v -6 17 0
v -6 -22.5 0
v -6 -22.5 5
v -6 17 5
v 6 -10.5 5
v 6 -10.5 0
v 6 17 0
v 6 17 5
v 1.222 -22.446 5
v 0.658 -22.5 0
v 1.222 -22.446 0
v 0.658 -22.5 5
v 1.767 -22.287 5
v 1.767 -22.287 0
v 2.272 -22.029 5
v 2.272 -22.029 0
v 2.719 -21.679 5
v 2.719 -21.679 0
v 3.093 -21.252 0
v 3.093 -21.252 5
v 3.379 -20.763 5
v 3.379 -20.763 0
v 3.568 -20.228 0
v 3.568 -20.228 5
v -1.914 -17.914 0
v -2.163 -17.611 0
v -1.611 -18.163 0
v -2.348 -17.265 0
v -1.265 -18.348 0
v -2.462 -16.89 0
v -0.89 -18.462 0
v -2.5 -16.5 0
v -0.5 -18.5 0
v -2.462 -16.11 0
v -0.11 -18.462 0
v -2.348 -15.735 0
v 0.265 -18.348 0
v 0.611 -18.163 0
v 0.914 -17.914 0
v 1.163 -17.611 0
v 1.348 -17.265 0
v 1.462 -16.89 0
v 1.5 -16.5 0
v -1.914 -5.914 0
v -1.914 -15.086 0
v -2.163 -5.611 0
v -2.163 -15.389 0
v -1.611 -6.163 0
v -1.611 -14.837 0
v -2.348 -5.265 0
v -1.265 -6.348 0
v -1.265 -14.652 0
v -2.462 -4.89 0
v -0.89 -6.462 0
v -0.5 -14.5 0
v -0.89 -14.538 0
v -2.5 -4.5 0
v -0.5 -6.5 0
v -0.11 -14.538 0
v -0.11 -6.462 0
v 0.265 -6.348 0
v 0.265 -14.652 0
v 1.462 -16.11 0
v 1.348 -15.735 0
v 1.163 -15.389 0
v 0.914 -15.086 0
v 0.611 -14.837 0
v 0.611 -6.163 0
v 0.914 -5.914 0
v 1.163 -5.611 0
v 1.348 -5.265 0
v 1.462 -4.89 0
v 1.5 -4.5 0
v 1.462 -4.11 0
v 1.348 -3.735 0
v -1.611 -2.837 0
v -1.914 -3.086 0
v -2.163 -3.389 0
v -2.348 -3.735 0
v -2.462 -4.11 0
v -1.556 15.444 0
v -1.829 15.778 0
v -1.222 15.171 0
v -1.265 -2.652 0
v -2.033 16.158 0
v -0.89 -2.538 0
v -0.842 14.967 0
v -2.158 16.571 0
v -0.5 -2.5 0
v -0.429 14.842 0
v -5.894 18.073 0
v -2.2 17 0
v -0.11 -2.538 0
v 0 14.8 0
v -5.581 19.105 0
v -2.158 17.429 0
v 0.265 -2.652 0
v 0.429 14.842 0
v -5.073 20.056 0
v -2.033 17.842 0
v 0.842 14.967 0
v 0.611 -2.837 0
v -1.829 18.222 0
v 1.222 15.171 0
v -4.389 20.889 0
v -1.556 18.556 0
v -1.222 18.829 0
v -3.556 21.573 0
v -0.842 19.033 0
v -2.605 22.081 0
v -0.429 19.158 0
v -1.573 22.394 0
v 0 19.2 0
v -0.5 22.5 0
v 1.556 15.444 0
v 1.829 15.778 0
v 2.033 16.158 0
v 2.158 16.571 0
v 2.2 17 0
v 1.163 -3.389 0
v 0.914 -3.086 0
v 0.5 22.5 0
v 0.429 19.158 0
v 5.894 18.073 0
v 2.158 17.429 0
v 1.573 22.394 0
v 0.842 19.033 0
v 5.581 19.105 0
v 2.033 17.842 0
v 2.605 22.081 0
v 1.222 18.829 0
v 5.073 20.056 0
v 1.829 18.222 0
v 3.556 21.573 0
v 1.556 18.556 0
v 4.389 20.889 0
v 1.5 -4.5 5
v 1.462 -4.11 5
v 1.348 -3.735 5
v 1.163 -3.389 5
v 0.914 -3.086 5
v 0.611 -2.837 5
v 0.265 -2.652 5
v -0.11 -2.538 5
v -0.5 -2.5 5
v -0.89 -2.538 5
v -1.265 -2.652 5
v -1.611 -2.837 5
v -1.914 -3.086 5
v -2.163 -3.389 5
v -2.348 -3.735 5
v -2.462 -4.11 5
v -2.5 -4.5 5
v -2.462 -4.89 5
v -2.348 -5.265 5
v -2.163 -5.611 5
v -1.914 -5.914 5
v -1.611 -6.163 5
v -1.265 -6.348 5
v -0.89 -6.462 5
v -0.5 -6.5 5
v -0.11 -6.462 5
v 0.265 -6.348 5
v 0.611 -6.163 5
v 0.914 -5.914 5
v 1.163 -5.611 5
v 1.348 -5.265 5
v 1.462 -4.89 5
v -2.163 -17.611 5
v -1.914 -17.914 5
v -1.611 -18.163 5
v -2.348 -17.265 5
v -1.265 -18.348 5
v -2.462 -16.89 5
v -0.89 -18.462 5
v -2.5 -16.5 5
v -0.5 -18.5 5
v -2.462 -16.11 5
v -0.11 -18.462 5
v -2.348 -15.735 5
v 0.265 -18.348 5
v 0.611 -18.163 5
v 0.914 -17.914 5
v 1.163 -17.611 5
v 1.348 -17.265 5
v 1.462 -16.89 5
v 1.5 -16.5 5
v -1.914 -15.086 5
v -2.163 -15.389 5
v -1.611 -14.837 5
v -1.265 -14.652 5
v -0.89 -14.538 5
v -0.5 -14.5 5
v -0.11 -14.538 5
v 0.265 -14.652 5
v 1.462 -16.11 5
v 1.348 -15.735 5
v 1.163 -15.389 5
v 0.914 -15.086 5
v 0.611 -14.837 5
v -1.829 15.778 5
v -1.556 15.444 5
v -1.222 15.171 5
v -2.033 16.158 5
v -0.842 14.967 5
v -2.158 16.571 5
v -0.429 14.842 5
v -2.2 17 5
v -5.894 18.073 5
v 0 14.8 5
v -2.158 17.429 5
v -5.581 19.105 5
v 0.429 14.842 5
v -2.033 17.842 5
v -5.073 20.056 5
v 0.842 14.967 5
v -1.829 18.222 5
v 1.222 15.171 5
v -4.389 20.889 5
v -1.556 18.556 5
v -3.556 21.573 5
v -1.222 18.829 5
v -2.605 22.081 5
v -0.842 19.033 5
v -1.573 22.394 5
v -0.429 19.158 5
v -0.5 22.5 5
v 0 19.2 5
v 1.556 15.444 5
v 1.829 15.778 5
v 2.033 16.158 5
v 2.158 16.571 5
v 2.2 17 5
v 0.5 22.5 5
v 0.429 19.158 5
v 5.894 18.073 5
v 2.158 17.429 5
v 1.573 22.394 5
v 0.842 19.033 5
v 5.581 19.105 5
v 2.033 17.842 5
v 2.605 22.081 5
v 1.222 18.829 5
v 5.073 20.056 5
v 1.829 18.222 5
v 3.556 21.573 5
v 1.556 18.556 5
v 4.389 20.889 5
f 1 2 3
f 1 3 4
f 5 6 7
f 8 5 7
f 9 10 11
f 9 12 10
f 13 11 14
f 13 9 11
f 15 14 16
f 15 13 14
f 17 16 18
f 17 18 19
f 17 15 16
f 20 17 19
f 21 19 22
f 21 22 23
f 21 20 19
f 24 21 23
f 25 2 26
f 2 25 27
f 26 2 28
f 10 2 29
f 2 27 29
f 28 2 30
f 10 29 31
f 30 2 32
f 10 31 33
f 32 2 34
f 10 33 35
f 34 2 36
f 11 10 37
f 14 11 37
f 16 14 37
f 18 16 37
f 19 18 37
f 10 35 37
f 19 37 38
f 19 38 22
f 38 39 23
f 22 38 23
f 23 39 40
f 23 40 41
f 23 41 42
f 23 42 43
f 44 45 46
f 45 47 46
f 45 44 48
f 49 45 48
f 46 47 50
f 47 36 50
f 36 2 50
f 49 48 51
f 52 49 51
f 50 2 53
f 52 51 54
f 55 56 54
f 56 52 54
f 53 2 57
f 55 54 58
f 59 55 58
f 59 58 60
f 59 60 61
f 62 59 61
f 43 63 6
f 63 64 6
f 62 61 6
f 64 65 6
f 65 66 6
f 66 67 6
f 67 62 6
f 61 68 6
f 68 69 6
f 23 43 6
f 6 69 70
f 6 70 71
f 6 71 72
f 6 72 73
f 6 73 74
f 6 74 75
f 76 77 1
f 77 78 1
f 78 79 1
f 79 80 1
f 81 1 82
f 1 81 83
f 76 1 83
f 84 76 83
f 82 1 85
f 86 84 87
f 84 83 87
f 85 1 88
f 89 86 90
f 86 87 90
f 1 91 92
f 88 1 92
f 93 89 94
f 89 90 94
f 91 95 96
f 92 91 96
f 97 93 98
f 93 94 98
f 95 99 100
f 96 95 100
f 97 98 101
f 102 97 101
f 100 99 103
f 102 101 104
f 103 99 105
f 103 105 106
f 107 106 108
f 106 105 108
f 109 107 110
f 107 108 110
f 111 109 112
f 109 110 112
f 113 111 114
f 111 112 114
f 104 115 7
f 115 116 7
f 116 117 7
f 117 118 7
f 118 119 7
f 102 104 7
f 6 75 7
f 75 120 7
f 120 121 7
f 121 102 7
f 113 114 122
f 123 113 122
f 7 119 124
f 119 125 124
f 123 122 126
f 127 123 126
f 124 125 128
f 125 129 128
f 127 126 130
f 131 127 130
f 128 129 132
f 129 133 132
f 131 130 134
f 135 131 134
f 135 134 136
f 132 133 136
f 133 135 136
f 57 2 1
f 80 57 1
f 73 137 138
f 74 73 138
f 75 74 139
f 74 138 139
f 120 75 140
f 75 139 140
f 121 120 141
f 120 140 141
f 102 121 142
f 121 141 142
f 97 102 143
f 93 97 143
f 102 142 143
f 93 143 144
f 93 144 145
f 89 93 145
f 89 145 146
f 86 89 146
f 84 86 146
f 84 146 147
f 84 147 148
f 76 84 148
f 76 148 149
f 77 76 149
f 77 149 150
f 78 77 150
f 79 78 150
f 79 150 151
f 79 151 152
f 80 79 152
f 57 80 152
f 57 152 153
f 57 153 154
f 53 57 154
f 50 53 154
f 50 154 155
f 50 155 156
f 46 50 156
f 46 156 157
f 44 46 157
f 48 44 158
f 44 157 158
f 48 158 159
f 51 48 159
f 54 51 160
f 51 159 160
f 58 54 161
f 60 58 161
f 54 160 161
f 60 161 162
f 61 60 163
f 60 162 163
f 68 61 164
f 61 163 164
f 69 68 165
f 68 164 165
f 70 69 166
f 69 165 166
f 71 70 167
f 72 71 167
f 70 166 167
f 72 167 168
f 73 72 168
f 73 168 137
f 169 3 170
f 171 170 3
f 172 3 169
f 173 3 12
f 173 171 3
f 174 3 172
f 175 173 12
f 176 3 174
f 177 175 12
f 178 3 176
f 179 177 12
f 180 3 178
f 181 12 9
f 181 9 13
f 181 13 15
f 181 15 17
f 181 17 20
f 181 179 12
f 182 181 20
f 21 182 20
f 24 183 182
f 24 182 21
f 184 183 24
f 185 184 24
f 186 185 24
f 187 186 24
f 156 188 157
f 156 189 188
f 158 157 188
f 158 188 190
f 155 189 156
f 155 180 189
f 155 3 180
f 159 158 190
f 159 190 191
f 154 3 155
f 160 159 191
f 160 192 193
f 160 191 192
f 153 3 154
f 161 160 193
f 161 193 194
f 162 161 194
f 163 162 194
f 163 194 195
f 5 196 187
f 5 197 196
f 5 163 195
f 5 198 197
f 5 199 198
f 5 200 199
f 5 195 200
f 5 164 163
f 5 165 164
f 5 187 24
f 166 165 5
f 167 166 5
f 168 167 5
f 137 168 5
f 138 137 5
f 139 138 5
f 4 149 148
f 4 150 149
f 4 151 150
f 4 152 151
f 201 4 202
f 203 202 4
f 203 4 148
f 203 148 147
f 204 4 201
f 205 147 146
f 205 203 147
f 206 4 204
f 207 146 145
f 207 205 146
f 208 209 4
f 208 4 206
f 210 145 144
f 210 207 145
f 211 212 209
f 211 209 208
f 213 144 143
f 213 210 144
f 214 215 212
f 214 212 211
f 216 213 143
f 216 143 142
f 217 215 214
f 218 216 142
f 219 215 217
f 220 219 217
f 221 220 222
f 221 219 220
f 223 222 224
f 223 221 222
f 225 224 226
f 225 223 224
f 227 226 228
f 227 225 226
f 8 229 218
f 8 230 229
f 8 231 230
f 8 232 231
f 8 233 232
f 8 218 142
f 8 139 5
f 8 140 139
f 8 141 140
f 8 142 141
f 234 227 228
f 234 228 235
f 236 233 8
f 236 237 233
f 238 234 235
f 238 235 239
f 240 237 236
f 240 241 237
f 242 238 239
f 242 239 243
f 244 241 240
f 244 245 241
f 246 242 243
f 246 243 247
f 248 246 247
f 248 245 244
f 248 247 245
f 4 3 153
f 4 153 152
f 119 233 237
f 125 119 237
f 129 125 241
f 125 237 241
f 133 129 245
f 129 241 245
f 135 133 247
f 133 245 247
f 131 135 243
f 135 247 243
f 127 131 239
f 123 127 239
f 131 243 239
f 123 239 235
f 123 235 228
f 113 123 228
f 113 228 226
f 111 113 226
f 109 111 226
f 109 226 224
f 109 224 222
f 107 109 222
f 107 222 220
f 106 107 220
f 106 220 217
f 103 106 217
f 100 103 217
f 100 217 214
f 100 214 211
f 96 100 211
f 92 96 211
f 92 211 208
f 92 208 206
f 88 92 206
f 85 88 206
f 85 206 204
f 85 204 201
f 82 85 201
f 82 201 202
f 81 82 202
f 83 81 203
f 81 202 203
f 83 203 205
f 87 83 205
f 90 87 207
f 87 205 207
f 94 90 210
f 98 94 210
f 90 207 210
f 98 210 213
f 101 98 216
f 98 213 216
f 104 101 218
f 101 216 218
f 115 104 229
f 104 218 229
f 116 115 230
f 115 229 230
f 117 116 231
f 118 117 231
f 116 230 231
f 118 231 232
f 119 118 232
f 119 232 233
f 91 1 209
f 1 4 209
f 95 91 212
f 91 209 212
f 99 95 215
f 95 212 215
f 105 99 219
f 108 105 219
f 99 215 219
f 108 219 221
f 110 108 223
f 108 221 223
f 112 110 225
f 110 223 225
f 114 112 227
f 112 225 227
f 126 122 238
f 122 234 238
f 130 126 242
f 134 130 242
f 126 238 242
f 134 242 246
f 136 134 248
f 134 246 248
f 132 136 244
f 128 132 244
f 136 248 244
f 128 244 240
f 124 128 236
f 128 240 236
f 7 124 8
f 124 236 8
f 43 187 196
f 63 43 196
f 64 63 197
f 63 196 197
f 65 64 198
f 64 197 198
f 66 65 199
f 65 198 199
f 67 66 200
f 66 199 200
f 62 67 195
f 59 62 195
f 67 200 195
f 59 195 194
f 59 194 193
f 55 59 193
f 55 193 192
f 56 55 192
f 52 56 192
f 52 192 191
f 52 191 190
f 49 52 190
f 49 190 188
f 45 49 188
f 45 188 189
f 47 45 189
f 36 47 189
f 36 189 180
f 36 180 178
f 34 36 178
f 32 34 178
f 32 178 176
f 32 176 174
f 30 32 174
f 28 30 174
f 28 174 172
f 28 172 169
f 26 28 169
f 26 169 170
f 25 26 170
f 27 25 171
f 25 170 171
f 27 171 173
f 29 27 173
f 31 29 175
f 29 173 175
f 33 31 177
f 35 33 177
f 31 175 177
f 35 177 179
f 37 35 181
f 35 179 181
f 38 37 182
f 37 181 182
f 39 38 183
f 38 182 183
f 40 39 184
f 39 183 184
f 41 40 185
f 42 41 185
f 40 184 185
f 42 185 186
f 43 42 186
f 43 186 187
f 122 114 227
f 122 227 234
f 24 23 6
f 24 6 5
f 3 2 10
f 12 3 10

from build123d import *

# Parameters (mm, degrees)
SKETCH_W      = 12
SKETCH_H      = 45
PAD_DEPTH     = 5
SKETCH001_R   = 2.2
SKETCH001_R_2 = 2
POCKET_DEPTH  = 5.001
CHAMFER_SIZE2 = 12
CHAMFER_SIZE  = 3
FILLET_R      = 3
FILLET001_R   = 5.5


with BuildPart() as part:
    # Sketch → Pad (new body)
    with BuildSketch(Plane.XY):
        Rectangle(SKETCH_W, SKETCH_H)
    extrude(amount=PAD_DEPTH)

    # Sketch001 (on Face6 of Pad) → Pocket (cut, through all)
    with BuildSketch(Plane.XY.offset(5)):
        with Locations((0, 17)):
            Circle(SKETCH001_R)
        with Locations((-0.5, -16.5)):
            Circle(SKETCH001_R_2)
        with Locations((-0.5, -4.5)):
            Circle(SKETCH001_R_2)
    extrude(amount=-POCKET_DEPTH, mode=Mode.SUBTRACT)

    # Chamfer
    chamfer_edges = [part.edges().sort_by_distance(p)[0] for p in [
        (6, -22.5, 2.5),
    ]]
    chamfer_side = part.faces().sort_by_distance((0, -22.5, 2.5))[0]
    chamfer(chamfer_edges, length=CHAMFER_SIZE, length2=CHAMFER_SIZE2, reference=chamfer_side)

    # Fillet
    fillet_edges = [part.edges().sort_by_distance(p)[0] for p in [
        (3, -22.5, 2.5),
    ]]
    fillet(fillet_edges, radius=FILLET_R)

    # Fillet001
    fillet001_edges = [part.edges().sort_by_distance(p)[0] for p in [
        (6, 22.5, 2.5),
        (-6, 22.5, 2.5),
    ]]
    fillet(fillet001_edges, radius=FILLET001_R)


solid = part.part
